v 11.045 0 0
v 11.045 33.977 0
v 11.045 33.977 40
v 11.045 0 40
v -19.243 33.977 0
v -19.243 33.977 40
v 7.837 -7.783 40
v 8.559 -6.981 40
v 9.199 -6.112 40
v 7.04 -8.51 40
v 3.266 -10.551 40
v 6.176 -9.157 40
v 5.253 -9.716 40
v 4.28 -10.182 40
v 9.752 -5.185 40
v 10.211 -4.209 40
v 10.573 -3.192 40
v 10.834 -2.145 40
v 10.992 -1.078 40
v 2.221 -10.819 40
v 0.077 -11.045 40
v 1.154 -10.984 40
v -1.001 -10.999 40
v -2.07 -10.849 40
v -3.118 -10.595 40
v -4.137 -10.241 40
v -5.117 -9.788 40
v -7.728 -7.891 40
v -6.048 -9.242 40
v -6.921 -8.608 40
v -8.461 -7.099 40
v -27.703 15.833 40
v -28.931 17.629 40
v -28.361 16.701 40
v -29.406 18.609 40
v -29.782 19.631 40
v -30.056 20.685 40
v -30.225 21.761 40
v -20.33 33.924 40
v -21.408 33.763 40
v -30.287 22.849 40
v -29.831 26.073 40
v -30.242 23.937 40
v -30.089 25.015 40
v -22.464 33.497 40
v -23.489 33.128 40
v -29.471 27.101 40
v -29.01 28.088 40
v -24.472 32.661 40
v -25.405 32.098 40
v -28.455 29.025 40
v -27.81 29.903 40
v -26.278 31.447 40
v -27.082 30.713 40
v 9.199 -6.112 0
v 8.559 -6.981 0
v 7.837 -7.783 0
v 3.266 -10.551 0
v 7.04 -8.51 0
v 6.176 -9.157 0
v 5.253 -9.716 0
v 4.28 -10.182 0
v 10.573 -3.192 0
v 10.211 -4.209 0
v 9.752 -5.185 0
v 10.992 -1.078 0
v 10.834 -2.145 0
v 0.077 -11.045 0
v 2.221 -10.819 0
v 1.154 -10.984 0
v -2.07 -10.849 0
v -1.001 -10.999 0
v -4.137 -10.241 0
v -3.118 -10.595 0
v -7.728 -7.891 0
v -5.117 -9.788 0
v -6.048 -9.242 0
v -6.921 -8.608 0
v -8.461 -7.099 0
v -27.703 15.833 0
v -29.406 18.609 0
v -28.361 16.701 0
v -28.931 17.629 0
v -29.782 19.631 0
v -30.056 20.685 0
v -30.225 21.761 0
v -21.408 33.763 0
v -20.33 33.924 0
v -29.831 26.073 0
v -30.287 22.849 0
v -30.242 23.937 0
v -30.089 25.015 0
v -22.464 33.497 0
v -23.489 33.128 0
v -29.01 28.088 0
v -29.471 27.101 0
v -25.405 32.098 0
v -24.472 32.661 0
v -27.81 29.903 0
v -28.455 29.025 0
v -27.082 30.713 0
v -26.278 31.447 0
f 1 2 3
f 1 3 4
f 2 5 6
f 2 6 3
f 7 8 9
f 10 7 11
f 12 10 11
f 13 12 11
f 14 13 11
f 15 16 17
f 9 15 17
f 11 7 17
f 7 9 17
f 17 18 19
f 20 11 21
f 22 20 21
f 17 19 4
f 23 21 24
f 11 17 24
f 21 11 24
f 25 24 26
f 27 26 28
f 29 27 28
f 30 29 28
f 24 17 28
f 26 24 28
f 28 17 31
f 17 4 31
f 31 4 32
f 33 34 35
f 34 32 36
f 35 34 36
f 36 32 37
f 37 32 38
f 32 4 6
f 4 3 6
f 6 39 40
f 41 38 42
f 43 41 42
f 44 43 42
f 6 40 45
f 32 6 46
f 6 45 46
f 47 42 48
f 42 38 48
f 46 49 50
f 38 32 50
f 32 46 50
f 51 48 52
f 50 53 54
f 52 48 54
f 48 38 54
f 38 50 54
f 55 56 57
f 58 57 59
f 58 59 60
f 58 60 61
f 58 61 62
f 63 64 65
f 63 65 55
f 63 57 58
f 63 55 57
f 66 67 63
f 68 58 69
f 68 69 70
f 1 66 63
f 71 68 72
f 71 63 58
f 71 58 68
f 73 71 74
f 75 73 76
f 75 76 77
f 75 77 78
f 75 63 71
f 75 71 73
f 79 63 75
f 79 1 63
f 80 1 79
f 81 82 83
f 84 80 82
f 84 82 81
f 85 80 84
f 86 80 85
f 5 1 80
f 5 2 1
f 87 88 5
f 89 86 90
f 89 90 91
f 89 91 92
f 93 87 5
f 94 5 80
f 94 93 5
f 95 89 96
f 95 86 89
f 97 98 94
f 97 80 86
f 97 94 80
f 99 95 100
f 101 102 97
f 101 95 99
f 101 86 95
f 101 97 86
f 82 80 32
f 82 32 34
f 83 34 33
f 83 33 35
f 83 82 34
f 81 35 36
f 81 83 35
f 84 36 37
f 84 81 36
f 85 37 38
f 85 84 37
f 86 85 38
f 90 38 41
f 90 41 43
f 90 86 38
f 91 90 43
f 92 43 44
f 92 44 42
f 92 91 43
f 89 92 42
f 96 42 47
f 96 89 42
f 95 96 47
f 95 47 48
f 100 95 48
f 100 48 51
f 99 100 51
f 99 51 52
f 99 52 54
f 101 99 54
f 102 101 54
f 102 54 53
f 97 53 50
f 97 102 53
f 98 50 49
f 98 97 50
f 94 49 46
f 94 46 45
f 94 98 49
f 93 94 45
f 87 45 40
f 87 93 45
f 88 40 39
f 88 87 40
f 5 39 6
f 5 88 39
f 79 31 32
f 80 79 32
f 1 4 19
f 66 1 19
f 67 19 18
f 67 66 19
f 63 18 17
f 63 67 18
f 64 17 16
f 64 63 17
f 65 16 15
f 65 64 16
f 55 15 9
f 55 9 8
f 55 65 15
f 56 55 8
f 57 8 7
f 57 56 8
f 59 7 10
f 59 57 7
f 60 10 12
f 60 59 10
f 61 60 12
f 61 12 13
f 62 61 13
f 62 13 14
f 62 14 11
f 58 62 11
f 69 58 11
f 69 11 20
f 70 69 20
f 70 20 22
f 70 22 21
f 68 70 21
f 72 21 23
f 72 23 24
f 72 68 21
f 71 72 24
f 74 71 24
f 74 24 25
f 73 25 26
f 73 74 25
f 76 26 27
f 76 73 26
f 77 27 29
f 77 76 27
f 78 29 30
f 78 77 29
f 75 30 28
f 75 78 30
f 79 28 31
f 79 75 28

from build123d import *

# Parameters (mm, degrees)
EXTRUDE_1_DEPTH = 40


with BuildPart() as part:
    # 草图1 → 凸台-拉伸1 (new body)
    with BuildSketch(Plane.XY):
        with BuildLine():
            Line((-8.460821473, -7.099472177), (-27.703402524, 15.832942921))
            ThreePointArc((-27.703402524, 15.832942921), (-29.252585633, 27.600156893), (-19.242581051, 33.977233123))
            Line((-19.242581051, 33.977233123), (11.044818024, 33.977233123))
            Line((11.044818024, 33.977233123), (11.044818024, 0))
            ThreePointArc((11.044818024, 0), (3.777550244, -10.378733995), (-8.460821473, -7.099472177))
        make_face()
    extrude(amount=EXTRUDE_1_DEPTH)


solid = part.part
